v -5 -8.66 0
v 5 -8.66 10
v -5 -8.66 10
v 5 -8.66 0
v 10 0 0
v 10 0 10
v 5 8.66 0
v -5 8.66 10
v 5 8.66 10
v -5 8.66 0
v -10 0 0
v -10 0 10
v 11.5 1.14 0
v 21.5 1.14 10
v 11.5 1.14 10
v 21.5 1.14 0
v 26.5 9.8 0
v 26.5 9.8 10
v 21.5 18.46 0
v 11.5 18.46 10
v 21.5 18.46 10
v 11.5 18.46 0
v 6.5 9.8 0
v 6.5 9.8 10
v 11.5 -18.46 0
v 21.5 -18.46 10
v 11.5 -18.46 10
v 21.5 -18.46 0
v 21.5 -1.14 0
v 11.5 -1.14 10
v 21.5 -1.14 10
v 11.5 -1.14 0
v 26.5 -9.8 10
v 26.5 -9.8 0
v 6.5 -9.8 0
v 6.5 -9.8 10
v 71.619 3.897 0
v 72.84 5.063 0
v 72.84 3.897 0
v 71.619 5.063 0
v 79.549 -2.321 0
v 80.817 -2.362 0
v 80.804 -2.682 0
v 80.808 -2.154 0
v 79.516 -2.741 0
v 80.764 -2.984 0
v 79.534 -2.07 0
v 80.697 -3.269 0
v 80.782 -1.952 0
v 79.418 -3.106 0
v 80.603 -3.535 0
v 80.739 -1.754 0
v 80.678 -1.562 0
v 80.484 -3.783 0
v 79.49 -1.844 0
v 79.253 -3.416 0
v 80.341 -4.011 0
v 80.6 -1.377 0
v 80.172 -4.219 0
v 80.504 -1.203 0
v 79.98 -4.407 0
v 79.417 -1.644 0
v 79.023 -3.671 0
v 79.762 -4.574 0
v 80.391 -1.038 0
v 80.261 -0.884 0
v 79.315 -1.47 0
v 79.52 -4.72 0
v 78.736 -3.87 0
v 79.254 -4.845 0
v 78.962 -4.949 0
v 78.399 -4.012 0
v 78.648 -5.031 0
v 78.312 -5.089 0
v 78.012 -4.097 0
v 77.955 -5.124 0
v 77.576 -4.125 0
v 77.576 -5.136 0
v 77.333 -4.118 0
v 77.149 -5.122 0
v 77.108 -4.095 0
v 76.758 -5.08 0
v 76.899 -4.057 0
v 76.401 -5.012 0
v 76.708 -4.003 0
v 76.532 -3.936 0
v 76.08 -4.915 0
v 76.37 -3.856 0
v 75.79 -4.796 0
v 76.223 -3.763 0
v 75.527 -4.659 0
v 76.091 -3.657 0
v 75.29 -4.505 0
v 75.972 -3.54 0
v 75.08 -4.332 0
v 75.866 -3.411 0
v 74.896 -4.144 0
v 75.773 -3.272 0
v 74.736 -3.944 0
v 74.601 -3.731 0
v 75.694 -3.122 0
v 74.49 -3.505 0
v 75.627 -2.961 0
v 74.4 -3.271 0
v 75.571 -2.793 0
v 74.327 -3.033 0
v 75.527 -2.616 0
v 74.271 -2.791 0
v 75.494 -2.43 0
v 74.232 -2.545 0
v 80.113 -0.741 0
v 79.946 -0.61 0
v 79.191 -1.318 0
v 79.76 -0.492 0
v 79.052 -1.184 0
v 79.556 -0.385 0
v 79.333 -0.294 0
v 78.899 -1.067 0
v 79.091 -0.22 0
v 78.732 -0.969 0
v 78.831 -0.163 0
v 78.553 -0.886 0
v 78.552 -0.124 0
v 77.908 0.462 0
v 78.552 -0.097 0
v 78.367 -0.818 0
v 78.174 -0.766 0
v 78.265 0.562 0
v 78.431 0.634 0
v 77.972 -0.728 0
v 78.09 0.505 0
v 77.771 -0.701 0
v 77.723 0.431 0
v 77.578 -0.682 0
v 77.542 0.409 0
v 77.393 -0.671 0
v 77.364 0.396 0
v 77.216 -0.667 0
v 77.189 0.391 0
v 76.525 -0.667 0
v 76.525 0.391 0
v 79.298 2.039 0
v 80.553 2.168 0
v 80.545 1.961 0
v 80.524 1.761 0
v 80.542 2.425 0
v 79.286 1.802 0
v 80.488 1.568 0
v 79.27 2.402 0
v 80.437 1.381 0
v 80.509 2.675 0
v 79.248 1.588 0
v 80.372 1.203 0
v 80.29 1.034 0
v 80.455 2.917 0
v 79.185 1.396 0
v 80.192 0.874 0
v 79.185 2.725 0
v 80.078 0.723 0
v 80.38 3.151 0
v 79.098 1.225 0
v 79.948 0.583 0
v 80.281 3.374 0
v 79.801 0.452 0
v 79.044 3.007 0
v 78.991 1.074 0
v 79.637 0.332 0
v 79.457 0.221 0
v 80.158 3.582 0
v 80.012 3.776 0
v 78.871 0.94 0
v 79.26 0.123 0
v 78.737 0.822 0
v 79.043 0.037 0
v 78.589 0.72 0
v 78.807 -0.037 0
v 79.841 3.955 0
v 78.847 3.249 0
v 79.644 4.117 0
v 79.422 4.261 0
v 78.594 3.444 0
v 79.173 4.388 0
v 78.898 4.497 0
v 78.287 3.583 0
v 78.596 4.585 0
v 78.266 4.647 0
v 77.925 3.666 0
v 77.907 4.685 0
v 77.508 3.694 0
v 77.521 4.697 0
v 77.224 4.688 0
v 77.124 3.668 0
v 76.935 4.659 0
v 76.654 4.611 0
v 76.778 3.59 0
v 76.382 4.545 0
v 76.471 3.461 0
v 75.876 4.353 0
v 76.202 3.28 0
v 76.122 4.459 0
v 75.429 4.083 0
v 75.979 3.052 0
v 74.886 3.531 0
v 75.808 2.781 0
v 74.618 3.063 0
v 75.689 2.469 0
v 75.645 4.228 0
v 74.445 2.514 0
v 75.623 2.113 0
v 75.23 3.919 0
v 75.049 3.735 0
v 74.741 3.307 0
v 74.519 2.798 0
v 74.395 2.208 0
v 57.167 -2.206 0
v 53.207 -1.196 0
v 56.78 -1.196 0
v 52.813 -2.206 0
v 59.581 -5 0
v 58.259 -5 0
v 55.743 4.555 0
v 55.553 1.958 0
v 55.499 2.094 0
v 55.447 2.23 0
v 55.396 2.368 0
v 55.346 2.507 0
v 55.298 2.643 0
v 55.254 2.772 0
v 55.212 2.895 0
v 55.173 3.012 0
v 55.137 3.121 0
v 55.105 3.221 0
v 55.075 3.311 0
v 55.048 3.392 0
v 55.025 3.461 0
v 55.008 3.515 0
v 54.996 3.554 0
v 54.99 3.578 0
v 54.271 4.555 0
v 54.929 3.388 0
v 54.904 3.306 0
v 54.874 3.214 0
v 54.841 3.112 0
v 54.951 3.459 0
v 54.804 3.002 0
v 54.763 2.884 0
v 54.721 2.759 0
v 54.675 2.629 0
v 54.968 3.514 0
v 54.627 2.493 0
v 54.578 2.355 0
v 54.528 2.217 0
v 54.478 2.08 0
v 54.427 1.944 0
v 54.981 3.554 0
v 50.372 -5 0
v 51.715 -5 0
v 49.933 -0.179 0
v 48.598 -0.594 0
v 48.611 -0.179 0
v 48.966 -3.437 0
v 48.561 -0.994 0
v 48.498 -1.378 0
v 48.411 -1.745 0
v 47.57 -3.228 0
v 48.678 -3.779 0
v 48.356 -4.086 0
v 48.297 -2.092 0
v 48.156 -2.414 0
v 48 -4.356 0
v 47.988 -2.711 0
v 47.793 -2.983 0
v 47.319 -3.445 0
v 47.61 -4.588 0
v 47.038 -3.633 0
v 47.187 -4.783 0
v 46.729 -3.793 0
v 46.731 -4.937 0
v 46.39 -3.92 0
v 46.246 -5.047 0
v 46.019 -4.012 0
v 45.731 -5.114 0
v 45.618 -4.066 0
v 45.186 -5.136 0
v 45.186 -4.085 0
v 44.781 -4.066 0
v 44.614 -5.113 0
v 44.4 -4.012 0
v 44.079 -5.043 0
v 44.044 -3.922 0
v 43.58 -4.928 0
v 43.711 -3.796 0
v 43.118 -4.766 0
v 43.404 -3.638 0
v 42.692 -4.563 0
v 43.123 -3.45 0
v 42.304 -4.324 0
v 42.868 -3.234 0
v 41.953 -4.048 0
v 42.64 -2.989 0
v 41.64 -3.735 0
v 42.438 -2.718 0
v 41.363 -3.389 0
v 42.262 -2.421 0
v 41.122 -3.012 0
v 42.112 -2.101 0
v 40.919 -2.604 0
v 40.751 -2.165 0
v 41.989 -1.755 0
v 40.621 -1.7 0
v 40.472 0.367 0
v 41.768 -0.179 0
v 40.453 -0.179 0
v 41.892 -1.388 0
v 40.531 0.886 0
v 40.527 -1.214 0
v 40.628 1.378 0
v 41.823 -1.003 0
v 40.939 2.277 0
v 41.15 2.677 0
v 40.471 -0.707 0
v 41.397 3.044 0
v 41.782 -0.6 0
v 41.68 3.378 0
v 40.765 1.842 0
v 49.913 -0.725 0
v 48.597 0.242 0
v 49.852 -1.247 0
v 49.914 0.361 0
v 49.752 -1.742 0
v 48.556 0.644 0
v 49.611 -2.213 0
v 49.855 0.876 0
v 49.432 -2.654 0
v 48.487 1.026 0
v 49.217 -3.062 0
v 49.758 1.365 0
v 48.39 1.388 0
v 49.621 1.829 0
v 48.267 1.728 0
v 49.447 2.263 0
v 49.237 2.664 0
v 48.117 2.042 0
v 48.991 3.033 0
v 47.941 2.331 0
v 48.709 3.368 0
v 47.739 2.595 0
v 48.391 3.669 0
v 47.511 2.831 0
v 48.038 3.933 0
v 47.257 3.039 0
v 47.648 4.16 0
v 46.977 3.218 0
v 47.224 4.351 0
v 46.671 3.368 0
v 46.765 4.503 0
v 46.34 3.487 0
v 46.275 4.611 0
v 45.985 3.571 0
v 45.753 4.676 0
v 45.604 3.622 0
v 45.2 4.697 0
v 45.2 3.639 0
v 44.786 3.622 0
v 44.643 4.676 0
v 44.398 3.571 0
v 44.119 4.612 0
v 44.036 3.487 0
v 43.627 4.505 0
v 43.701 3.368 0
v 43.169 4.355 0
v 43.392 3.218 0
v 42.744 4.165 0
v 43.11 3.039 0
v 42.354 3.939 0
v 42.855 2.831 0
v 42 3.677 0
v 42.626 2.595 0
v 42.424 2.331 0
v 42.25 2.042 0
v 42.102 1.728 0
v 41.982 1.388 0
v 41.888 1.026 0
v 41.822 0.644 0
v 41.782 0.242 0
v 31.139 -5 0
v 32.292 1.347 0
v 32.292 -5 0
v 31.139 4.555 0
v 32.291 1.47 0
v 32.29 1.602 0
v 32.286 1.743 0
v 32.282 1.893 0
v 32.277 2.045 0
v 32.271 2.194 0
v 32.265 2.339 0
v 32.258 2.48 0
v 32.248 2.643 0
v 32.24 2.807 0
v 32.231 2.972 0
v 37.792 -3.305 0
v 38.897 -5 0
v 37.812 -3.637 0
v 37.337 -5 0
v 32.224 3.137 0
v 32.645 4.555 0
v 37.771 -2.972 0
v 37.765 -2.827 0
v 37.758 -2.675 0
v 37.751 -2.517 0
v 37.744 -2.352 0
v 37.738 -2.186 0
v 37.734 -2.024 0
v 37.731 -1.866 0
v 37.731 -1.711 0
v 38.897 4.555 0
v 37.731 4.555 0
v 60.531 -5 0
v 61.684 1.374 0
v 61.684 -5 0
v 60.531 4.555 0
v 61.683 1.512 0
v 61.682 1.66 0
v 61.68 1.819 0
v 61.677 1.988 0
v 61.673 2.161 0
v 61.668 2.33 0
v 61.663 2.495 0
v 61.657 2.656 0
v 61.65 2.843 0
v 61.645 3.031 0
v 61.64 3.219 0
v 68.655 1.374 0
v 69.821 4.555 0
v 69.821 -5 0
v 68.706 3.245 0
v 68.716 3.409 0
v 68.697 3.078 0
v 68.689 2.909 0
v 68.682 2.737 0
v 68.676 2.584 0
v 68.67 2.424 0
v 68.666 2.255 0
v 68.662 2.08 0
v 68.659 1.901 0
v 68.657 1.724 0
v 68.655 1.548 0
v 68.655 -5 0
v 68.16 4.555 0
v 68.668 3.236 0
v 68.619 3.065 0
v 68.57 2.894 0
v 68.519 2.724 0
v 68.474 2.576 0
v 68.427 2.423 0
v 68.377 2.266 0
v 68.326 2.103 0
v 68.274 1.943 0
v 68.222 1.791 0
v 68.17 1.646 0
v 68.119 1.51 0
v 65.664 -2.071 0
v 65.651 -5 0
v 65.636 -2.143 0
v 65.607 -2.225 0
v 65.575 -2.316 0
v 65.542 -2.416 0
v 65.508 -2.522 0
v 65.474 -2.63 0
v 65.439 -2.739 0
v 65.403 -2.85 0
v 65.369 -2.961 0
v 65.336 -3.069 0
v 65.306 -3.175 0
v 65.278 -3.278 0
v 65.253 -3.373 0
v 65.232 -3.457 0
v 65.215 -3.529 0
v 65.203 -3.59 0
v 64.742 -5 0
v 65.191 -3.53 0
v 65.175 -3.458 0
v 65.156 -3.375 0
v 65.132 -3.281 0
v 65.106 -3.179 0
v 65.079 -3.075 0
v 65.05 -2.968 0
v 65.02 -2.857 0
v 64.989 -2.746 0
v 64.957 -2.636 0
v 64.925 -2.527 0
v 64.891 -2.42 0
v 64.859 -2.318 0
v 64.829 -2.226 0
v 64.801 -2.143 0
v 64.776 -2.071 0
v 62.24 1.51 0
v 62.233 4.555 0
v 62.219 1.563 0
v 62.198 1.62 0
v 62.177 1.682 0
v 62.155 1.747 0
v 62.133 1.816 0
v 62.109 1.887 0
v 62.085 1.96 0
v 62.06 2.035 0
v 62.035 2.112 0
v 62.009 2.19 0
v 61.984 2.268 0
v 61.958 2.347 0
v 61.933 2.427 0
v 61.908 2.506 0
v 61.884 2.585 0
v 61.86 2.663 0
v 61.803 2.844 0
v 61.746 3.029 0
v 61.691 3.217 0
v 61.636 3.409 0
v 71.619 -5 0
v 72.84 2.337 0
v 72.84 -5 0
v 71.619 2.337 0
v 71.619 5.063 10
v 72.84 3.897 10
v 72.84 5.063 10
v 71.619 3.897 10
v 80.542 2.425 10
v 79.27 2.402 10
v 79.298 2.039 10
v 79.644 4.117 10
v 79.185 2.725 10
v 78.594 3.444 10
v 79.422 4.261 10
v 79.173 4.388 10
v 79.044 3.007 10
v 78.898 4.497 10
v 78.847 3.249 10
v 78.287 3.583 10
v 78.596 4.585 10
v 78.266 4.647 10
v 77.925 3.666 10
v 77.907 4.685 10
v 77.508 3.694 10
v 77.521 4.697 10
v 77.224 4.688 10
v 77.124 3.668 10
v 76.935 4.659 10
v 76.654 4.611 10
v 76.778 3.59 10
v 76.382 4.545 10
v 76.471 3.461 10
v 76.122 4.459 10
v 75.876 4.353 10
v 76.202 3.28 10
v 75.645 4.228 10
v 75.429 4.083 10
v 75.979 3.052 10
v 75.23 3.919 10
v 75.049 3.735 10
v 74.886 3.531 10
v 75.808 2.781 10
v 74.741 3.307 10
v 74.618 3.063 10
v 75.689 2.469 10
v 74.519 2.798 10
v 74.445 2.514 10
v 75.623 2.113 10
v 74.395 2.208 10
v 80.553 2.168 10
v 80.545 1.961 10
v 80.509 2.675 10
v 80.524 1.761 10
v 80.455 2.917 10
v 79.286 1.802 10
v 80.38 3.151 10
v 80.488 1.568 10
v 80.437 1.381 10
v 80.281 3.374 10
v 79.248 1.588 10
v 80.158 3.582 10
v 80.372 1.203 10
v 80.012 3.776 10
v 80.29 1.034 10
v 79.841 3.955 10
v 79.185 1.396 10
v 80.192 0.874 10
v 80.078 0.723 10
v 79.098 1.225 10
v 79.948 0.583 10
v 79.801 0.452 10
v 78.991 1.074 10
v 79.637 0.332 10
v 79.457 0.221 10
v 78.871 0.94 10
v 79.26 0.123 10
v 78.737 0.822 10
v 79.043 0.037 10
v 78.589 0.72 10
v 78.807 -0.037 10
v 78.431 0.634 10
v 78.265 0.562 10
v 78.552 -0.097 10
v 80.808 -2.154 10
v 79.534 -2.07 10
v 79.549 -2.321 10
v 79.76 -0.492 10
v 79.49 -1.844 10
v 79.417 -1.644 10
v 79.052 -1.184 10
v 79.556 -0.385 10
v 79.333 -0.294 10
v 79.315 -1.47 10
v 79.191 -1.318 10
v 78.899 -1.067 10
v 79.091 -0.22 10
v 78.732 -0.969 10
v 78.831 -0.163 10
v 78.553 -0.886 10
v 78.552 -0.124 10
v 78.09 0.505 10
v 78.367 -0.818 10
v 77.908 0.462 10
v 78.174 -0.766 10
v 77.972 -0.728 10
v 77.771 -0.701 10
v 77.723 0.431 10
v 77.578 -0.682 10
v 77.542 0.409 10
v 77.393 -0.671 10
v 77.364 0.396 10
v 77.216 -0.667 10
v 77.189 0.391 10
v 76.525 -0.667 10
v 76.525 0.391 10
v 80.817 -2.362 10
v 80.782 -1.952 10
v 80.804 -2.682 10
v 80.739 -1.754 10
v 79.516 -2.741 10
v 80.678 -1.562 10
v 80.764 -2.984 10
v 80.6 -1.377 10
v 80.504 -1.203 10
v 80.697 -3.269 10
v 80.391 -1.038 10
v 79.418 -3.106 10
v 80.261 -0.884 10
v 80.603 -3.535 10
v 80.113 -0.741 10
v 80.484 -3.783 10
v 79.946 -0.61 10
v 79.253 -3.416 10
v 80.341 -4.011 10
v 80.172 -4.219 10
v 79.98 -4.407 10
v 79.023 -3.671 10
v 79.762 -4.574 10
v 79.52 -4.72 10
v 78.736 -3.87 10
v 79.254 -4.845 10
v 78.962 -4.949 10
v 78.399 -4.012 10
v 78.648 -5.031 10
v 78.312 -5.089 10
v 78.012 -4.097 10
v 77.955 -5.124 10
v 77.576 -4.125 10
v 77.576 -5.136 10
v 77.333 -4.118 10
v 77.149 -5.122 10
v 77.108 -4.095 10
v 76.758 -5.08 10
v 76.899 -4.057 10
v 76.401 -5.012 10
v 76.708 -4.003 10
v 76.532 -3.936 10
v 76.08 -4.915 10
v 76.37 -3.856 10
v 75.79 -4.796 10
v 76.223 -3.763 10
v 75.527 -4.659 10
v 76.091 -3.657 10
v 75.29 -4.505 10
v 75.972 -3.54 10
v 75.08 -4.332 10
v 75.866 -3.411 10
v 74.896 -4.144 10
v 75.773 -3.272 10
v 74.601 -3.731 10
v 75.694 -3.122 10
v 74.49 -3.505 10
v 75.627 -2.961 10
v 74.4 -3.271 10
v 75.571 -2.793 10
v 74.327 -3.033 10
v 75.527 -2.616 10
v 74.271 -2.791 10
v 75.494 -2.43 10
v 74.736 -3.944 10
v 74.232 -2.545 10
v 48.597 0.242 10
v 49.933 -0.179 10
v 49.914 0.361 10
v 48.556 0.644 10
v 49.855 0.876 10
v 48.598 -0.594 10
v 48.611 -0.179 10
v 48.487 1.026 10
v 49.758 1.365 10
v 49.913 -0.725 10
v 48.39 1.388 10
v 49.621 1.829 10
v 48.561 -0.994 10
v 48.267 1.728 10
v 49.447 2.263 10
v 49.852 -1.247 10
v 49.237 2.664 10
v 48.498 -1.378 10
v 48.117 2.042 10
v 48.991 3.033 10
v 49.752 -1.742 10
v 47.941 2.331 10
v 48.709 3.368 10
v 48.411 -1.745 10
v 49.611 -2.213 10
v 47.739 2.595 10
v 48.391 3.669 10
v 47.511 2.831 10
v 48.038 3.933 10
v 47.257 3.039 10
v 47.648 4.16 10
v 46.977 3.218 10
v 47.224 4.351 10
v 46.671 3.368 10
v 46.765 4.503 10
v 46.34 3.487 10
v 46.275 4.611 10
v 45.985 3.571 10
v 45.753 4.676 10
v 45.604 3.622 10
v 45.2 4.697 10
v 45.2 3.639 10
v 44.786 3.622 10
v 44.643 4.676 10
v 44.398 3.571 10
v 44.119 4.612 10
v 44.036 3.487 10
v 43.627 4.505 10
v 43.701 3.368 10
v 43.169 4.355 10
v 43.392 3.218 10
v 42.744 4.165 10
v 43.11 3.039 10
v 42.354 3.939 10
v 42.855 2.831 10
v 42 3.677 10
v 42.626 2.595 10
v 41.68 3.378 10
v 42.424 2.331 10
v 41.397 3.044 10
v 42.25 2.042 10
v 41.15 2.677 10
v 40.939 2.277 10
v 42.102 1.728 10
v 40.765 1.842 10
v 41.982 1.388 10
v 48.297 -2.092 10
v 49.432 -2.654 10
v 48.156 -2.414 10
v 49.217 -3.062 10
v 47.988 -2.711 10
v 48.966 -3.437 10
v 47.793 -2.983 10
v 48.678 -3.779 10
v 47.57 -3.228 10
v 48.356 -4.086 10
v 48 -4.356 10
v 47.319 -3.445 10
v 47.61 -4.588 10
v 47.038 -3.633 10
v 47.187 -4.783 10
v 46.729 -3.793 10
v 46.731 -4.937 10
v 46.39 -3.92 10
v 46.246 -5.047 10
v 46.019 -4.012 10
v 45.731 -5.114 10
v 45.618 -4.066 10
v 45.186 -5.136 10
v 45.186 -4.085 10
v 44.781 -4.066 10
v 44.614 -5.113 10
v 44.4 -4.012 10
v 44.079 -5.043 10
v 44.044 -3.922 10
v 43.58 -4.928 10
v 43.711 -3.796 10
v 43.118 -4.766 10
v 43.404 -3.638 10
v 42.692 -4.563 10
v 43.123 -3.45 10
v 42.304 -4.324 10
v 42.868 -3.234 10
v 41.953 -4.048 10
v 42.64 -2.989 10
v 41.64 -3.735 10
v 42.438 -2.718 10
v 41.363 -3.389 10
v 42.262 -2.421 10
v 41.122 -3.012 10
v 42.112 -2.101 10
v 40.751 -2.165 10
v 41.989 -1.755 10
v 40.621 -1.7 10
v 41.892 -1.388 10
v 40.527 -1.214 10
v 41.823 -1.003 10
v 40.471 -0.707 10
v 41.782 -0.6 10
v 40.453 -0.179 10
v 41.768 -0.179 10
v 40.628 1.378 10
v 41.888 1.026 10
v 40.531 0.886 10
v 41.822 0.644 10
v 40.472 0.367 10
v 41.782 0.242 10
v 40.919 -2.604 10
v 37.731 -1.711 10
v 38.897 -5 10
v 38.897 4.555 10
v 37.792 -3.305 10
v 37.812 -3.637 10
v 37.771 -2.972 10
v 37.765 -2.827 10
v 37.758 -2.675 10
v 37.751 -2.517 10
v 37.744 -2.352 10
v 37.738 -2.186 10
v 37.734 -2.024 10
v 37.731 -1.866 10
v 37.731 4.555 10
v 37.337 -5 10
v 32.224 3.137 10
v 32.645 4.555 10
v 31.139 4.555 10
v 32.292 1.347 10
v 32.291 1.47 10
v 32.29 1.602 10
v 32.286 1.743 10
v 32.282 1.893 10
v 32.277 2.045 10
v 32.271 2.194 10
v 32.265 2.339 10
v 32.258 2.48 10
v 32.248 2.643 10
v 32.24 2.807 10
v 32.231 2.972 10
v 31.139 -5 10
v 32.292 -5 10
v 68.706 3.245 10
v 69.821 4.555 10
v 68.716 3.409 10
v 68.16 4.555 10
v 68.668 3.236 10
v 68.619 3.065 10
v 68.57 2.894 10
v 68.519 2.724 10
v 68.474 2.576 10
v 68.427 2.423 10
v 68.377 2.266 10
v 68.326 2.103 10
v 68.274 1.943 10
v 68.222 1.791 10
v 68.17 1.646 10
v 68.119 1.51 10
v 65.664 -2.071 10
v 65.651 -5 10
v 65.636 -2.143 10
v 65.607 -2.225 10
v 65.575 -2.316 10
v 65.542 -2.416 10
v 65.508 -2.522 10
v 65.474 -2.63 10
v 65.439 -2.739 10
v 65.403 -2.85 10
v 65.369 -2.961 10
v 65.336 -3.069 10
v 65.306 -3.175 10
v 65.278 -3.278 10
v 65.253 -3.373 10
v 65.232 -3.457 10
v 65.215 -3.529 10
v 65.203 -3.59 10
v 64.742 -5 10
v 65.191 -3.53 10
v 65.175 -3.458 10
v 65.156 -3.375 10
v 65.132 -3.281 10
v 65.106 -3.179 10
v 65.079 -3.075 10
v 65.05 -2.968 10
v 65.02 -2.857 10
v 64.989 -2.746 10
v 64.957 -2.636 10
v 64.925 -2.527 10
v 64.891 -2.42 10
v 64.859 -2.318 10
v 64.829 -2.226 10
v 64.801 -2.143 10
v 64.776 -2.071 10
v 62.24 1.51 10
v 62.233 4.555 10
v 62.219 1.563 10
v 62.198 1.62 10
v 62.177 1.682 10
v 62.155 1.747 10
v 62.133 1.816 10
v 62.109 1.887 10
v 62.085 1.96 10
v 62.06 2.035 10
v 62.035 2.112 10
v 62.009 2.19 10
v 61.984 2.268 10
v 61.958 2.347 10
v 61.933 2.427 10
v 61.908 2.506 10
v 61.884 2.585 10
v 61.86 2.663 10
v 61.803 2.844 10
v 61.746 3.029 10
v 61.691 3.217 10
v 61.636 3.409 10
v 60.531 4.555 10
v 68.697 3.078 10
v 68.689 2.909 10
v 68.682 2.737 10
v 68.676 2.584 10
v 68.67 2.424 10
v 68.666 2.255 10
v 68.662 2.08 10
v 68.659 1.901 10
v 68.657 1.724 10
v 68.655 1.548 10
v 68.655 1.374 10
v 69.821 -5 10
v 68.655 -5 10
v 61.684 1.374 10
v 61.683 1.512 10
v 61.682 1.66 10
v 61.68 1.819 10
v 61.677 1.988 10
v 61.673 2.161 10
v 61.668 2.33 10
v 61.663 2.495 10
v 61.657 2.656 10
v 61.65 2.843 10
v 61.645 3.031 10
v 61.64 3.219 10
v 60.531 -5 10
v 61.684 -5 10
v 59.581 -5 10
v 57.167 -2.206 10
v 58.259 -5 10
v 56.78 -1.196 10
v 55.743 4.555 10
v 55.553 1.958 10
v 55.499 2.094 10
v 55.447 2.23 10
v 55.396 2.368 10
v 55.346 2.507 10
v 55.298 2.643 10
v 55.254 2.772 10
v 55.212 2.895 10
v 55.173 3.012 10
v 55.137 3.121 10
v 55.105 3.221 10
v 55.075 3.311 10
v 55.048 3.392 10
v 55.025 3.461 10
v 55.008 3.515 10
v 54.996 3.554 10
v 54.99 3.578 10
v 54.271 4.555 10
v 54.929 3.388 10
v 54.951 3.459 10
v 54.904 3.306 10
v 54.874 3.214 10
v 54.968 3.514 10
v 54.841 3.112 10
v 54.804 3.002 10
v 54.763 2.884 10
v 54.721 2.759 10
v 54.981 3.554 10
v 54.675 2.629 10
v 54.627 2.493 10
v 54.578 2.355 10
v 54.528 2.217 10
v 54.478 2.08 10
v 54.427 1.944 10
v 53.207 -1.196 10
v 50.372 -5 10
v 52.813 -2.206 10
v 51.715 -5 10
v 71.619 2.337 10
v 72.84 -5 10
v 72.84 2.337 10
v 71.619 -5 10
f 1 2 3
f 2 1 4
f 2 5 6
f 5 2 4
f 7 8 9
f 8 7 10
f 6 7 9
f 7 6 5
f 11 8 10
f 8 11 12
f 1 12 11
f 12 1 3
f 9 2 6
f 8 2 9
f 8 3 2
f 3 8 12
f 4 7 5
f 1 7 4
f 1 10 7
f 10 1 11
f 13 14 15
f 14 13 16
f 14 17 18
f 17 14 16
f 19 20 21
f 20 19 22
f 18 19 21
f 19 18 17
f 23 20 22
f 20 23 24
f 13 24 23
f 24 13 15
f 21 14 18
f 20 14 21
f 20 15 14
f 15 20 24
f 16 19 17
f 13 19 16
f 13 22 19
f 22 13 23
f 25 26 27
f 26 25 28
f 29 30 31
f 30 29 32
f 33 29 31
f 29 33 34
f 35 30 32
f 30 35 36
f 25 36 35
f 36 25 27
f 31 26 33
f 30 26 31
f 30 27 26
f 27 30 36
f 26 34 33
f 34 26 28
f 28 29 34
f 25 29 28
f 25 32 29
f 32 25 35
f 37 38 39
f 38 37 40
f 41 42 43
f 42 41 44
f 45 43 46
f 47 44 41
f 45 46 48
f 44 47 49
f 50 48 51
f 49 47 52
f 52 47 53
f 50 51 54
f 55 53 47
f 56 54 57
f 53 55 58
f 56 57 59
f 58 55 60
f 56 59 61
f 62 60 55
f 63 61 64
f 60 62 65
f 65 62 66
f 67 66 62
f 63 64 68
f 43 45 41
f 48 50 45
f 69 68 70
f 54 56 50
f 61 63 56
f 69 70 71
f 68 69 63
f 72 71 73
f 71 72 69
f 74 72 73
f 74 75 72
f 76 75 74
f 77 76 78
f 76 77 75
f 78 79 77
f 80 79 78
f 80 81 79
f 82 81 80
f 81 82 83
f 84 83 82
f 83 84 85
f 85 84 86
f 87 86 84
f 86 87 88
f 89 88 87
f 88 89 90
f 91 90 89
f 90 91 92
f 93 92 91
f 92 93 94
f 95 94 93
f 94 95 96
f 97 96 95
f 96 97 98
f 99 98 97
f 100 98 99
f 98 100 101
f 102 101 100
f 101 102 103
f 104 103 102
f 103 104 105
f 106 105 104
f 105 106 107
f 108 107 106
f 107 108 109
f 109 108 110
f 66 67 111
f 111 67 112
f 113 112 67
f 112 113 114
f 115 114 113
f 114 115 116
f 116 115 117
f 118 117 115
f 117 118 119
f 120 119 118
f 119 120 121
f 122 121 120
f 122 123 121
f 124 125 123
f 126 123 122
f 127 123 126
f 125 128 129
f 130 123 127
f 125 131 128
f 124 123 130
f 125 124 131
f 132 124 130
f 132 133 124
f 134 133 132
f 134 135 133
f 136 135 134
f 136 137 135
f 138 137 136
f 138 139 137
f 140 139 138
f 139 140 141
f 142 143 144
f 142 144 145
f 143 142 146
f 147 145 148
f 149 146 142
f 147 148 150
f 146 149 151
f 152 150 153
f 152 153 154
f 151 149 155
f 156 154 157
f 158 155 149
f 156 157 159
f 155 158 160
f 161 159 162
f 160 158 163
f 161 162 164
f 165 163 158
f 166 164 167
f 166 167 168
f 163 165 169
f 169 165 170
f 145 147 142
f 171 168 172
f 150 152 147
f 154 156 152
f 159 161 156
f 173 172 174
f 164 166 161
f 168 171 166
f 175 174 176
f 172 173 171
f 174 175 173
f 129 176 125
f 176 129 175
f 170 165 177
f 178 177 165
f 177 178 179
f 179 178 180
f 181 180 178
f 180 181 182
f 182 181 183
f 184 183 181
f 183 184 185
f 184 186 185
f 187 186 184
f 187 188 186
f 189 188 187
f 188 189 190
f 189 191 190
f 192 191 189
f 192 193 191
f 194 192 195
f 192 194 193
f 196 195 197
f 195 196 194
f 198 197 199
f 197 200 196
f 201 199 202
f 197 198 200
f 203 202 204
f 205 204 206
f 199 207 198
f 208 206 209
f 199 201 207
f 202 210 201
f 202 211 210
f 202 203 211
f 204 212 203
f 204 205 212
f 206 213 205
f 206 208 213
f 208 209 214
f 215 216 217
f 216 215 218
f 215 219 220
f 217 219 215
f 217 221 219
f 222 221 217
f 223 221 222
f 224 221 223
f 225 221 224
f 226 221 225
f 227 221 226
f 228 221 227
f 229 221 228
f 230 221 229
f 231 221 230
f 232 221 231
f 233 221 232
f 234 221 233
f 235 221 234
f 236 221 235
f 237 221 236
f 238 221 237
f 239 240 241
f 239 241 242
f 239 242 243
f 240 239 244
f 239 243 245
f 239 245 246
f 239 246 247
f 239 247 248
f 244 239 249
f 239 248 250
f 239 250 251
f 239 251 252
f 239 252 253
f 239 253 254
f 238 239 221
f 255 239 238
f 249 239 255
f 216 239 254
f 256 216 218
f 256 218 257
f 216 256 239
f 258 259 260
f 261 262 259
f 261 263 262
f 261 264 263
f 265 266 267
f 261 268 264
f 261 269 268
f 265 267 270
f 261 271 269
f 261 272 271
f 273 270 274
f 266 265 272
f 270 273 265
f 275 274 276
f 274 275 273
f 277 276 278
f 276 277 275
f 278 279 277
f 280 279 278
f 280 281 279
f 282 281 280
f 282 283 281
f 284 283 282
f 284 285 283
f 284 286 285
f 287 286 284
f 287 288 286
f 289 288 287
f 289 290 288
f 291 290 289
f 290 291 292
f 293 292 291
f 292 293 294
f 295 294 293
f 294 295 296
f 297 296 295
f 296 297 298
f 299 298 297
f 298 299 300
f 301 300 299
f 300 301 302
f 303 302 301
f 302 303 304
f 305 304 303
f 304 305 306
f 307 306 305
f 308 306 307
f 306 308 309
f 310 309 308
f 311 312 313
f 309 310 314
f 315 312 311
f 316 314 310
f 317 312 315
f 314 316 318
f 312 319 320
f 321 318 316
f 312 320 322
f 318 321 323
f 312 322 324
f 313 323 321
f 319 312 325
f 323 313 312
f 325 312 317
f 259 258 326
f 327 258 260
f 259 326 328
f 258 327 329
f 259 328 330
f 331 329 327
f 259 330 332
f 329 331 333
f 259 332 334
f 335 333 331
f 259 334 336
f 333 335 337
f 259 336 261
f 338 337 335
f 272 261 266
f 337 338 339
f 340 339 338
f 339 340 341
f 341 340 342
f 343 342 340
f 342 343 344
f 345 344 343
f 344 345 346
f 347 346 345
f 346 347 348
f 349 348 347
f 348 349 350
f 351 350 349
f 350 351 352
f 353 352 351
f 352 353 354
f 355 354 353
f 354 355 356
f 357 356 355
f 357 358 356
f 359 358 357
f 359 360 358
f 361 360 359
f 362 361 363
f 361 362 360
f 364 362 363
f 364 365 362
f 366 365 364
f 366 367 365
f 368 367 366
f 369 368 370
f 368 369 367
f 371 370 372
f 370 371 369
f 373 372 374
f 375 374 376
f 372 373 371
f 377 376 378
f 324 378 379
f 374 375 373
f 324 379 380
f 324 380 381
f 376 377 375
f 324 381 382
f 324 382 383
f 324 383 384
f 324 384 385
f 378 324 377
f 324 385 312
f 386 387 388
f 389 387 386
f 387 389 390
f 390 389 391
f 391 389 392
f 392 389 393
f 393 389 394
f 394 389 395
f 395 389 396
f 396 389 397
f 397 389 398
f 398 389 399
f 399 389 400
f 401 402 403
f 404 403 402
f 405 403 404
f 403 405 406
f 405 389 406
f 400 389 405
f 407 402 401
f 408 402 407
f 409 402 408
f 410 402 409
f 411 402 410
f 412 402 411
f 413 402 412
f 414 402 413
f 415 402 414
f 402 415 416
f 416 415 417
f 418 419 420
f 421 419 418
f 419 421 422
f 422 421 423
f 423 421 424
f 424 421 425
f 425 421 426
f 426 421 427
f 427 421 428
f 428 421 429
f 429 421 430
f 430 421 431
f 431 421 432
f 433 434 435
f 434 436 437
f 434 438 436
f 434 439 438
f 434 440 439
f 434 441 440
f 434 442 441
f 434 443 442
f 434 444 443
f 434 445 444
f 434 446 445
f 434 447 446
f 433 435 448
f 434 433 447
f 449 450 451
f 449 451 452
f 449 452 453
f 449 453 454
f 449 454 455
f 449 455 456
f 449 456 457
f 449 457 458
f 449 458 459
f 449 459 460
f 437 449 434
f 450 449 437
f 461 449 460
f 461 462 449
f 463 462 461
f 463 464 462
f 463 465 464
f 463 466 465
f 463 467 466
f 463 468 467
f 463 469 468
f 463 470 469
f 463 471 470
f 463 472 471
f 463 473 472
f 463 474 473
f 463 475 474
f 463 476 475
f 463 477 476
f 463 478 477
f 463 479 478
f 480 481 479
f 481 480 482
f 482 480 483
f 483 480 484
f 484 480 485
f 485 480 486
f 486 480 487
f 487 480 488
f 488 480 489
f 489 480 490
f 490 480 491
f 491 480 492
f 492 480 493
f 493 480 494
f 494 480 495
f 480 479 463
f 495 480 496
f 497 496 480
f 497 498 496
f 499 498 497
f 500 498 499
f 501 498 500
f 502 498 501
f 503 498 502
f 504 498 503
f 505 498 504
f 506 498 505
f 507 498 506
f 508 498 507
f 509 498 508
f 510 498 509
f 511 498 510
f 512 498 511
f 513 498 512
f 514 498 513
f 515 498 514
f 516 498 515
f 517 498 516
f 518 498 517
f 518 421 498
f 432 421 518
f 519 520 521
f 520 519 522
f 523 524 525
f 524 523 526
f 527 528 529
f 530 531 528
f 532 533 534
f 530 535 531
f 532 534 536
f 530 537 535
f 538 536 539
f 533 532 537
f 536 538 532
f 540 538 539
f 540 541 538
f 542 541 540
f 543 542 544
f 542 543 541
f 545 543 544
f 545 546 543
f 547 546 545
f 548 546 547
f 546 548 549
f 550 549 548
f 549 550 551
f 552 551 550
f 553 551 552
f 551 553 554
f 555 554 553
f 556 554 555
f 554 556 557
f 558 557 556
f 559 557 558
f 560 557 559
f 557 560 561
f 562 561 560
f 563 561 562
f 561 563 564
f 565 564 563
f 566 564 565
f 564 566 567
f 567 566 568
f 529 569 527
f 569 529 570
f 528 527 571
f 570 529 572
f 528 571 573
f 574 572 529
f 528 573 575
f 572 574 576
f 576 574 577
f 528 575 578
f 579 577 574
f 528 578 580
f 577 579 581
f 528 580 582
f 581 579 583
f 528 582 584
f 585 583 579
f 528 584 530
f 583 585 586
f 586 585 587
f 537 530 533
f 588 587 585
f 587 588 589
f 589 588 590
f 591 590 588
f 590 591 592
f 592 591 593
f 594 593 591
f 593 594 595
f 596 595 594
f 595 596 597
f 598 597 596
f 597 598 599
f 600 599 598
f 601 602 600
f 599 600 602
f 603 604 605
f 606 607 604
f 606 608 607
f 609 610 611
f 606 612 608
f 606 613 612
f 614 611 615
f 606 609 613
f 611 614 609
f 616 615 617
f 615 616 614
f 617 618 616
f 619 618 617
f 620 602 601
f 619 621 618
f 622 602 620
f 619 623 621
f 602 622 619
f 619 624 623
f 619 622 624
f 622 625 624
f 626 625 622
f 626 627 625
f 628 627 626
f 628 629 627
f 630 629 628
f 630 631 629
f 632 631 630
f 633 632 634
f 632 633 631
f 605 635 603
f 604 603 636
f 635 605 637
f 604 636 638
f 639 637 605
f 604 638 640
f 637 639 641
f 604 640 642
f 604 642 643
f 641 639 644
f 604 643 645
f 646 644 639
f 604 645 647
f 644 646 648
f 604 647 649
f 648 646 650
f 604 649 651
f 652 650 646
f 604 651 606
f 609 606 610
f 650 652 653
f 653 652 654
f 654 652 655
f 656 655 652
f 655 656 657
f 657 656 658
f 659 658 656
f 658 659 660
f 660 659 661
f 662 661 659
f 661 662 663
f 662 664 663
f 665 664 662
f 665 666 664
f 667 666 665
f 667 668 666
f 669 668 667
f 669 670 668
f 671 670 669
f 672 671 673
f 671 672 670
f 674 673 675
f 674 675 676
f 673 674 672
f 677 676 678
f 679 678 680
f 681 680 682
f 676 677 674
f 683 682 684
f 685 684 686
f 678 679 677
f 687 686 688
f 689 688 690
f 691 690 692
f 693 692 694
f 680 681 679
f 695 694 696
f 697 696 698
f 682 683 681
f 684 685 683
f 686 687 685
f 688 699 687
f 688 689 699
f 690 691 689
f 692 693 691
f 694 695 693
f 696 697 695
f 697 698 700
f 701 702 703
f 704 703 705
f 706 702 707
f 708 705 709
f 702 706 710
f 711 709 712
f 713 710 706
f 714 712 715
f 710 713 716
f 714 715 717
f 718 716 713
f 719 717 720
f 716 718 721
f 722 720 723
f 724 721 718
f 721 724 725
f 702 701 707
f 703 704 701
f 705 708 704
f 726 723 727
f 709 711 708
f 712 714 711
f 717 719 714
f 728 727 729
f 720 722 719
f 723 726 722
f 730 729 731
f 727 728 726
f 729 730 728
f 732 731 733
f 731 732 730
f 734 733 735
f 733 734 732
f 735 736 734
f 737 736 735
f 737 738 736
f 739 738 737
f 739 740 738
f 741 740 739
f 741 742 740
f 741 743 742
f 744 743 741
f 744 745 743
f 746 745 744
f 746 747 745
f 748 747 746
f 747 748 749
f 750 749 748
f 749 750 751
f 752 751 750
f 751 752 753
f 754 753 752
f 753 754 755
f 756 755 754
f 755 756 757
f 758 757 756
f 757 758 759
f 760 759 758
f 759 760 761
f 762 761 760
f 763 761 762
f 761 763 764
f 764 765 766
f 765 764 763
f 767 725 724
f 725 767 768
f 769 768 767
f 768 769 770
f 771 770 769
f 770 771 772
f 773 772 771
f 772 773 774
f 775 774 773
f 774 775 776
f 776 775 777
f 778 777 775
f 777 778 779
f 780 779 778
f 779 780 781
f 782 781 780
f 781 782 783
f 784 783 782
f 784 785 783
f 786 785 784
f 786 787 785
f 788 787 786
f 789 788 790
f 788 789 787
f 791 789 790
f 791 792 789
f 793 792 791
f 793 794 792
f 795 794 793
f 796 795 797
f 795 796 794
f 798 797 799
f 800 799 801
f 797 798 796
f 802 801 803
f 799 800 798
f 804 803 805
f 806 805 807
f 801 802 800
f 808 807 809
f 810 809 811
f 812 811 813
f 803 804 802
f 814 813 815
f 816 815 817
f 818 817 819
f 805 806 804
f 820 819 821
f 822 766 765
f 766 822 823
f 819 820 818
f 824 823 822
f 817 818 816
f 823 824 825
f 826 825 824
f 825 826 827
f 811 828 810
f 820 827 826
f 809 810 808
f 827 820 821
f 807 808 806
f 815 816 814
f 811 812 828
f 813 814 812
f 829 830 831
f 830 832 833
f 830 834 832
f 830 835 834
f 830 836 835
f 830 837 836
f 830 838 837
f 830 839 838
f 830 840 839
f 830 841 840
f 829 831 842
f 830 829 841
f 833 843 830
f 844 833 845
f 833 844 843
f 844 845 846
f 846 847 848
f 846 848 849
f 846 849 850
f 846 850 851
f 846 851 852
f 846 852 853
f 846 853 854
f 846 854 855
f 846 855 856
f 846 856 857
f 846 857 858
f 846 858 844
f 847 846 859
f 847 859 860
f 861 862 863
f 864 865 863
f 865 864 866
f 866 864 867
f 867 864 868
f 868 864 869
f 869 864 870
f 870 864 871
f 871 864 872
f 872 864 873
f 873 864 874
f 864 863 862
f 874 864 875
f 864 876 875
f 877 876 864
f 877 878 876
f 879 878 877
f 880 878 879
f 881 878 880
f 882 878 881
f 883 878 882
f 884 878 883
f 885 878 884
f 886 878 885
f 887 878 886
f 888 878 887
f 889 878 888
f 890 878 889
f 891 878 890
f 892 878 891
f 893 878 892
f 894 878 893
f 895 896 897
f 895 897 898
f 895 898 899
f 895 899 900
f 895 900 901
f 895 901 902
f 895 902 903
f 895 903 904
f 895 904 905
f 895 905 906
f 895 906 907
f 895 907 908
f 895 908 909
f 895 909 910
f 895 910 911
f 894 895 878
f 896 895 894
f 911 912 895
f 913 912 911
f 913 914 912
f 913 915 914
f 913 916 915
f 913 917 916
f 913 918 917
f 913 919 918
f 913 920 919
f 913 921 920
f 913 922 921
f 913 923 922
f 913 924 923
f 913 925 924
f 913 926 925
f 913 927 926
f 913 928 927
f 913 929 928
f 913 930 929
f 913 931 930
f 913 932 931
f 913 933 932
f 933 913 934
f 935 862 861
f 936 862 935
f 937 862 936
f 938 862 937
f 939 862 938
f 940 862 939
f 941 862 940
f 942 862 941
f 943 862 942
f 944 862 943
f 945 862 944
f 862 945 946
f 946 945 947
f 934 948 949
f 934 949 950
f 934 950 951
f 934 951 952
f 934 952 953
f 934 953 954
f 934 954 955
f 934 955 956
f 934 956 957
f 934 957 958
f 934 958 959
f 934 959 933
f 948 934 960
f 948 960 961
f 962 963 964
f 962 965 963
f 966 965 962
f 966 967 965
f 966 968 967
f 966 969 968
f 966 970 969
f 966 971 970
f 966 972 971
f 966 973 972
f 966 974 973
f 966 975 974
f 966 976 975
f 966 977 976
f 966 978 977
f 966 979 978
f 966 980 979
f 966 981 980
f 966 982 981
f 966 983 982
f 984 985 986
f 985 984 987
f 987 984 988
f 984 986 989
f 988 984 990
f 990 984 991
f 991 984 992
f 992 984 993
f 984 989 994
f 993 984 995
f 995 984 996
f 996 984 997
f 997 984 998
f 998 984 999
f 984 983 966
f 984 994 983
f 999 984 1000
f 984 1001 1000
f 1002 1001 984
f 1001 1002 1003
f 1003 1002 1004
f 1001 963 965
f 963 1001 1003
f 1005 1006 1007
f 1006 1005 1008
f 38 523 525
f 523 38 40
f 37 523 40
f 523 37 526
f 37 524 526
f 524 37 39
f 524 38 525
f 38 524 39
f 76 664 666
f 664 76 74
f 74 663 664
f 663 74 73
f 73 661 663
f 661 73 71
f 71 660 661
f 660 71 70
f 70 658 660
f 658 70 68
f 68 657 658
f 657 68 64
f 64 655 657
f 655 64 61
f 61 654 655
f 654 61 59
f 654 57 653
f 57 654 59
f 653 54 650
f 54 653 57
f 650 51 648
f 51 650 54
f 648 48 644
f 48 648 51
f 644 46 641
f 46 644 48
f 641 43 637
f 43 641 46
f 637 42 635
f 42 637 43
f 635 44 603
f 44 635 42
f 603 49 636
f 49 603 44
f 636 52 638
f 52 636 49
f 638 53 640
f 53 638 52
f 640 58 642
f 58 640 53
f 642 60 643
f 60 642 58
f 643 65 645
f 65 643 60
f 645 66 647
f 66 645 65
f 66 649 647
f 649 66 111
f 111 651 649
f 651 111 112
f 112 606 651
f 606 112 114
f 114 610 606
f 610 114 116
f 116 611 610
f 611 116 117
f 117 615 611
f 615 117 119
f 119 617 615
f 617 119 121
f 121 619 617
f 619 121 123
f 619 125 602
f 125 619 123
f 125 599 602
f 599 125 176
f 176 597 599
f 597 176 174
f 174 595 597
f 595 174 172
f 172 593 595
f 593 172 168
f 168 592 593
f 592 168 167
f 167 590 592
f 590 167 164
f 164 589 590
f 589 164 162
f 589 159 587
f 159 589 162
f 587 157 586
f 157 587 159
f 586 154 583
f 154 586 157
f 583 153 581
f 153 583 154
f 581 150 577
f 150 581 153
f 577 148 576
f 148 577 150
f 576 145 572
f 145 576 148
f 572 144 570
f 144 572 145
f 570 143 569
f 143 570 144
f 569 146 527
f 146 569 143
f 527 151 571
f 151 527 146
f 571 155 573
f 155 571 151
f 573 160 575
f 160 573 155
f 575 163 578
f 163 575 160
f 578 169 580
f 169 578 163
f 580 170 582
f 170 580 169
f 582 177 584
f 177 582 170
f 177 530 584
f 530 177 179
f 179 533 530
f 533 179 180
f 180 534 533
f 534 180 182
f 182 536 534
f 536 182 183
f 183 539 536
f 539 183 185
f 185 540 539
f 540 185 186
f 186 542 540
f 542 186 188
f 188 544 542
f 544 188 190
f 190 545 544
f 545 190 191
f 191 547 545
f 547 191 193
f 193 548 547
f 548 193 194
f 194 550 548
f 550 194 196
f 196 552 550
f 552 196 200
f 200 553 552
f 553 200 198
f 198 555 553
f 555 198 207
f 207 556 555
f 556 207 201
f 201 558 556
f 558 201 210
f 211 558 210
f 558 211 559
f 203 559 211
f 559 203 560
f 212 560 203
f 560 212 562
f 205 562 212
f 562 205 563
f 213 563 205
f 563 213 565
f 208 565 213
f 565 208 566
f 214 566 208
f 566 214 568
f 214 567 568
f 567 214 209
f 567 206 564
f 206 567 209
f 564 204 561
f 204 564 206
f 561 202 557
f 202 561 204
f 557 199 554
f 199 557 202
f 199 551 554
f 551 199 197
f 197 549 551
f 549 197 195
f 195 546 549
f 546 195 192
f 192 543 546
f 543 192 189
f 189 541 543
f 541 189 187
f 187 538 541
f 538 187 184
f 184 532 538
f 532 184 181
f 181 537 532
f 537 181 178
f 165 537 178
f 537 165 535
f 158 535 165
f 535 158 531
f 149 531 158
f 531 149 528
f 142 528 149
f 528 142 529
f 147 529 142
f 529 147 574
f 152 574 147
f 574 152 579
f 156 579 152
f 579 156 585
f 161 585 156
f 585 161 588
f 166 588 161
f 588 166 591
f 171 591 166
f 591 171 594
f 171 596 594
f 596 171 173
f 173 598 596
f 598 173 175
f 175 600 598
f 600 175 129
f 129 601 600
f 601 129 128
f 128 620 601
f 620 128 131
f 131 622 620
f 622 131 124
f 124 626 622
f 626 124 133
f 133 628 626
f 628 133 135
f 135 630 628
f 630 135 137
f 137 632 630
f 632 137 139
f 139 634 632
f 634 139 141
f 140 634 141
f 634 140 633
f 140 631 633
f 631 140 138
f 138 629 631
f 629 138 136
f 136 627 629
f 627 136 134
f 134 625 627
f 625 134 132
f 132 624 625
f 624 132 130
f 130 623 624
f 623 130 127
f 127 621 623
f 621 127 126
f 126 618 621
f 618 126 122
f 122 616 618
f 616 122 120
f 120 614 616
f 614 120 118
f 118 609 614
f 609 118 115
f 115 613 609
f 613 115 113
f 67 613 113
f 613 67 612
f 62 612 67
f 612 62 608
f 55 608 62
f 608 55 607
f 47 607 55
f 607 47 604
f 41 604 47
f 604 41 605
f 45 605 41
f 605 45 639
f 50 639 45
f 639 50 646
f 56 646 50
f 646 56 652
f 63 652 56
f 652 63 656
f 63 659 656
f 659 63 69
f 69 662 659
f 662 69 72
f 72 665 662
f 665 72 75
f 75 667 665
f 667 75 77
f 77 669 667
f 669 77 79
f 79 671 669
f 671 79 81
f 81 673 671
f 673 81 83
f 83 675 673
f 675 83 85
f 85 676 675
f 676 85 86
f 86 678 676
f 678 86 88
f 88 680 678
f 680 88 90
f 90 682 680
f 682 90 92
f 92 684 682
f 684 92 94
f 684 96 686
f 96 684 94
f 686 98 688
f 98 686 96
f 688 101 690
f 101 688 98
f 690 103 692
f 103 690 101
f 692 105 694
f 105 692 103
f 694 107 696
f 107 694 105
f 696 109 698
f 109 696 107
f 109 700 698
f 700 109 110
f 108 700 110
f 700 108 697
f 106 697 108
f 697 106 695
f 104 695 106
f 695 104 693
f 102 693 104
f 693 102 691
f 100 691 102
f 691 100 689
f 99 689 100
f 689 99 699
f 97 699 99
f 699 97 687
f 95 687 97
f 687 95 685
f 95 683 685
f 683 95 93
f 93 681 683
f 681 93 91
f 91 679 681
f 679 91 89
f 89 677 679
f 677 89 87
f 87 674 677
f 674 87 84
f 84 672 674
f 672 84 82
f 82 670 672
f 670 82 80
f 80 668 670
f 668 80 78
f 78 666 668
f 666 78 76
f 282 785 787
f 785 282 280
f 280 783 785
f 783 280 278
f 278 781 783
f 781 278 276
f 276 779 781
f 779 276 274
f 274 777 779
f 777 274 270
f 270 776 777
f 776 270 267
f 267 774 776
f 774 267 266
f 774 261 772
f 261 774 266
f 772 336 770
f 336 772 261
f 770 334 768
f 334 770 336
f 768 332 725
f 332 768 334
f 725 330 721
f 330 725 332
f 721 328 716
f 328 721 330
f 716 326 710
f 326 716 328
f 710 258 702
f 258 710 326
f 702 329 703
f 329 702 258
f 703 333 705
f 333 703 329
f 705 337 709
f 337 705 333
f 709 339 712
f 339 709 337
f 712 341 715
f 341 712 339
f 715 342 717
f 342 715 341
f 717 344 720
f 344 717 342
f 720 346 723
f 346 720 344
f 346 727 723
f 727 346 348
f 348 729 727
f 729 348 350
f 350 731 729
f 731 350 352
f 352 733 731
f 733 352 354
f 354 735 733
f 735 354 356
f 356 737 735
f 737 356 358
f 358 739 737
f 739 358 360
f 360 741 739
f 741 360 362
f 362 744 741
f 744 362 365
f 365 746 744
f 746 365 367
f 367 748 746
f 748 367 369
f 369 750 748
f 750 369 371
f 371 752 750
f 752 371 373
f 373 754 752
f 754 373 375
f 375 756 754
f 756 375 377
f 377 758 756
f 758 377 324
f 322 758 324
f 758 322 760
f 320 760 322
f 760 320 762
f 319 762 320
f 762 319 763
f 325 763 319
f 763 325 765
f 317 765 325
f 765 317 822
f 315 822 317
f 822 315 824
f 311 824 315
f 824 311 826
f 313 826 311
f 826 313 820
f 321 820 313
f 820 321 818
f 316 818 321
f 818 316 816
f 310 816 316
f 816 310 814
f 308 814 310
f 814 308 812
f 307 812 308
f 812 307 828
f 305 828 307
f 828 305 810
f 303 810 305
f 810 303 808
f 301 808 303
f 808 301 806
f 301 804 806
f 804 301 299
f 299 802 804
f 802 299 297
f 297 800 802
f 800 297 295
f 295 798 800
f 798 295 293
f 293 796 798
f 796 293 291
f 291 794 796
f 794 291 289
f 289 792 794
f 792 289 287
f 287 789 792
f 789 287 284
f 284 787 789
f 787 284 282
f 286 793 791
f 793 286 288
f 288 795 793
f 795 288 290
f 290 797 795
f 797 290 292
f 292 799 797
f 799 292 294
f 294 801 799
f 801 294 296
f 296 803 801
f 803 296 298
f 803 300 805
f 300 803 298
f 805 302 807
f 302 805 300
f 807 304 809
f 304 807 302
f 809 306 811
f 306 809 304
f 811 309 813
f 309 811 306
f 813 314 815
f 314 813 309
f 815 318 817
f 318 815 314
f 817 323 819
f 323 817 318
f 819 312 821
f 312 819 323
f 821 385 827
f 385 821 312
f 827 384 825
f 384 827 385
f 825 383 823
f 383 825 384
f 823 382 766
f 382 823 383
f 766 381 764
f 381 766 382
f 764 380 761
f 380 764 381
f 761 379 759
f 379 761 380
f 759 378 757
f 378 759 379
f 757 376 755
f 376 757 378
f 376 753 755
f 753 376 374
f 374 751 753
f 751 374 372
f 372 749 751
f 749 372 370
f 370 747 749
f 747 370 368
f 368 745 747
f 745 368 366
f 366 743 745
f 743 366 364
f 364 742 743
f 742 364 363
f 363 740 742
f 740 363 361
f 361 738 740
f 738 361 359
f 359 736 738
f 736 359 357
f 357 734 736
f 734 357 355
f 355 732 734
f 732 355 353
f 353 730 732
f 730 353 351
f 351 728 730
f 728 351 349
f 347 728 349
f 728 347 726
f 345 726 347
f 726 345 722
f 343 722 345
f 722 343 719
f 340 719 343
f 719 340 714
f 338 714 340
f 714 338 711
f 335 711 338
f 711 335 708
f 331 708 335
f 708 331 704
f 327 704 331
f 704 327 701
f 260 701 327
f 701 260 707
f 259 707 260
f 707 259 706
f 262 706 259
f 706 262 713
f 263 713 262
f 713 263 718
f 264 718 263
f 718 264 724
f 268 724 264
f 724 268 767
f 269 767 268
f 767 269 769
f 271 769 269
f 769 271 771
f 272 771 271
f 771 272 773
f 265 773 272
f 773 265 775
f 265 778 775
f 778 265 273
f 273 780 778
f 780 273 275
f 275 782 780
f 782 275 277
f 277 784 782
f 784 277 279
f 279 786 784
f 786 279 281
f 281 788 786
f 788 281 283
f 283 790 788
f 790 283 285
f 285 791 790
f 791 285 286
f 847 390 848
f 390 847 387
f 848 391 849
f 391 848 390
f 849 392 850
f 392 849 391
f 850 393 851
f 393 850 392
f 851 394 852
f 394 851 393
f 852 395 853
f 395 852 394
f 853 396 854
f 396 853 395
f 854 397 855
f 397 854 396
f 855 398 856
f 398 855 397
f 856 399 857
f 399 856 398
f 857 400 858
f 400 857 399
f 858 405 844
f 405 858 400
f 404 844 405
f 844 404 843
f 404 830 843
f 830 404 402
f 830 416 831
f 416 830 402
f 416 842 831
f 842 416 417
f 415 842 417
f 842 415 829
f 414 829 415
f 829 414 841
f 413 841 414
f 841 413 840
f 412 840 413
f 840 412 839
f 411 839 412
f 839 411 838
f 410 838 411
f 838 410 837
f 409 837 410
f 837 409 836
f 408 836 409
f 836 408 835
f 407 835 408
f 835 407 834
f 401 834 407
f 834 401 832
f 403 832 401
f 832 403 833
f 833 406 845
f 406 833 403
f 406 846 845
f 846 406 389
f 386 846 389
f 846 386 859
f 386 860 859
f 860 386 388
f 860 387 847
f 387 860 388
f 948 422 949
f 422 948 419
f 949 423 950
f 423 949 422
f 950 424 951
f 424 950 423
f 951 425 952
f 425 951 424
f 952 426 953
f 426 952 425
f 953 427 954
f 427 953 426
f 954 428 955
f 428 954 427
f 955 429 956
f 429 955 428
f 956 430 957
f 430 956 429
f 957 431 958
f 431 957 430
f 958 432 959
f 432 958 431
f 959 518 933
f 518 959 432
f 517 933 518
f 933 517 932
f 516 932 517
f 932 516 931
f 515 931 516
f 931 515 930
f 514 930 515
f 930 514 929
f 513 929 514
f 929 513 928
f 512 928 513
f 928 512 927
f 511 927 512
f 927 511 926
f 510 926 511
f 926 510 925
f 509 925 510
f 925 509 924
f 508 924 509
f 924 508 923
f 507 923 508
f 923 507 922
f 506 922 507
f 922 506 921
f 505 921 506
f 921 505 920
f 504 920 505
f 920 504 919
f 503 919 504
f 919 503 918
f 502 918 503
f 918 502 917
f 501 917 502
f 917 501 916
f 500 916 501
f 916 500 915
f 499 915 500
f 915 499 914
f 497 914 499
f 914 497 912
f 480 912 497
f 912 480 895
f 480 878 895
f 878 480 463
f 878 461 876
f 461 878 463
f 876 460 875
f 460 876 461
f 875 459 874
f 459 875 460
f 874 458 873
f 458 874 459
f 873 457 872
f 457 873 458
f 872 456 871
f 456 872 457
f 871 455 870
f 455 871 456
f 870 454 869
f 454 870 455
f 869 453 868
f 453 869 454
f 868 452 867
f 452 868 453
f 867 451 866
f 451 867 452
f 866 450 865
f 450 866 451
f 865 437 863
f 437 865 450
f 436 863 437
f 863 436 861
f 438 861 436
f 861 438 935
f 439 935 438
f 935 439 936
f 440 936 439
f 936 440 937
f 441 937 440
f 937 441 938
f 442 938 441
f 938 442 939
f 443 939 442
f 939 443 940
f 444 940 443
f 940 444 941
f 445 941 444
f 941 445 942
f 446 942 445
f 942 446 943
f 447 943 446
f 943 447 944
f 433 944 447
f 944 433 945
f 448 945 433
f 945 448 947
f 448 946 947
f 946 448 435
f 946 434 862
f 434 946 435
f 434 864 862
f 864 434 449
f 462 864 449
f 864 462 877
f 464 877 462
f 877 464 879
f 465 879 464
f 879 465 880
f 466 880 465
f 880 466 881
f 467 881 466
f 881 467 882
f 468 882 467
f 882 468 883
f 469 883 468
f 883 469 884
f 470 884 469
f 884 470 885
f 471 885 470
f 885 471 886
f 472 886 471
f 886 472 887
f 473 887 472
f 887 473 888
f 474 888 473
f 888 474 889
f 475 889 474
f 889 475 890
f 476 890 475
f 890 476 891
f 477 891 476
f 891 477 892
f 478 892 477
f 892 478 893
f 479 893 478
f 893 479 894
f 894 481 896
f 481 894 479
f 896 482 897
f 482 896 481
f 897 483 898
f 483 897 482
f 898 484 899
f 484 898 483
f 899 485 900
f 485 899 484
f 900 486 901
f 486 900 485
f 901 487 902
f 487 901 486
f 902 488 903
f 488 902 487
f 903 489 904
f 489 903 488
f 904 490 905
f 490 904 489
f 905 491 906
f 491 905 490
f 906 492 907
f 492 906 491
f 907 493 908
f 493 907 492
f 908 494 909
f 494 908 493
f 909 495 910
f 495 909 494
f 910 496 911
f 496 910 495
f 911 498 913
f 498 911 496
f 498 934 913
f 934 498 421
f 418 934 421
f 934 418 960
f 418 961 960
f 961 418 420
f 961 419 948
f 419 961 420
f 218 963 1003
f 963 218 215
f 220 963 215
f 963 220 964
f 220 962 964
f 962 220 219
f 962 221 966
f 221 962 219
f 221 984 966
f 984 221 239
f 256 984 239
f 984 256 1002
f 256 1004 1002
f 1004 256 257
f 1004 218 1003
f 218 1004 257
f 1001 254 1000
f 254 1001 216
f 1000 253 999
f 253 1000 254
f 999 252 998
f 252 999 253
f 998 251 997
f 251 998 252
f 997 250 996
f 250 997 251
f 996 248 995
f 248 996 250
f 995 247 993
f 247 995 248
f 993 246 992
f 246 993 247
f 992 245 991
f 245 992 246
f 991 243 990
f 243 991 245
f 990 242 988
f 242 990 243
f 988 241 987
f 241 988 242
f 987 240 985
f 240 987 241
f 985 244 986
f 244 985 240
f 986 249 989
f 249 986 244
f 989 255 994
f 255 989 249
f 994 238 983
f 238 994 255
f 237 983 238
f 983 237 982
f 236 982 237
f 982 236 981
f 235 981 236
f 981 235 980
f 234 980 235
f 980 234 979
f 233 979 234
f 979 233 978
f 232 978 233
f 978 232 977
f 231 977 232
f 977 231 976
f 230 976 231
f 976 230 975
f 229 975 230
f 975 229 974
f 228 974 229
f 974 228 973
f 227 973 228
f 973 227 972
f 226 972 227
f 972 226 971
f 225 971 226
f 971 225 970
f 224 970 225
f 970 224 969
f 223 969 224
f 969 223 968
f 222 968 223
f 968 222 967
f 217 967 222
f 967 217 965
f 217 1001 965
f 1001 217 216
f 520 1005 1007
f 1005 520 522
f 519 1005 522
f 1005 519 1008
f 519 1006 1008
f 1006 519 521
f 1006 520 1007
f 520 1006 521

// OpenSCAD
cylinder(h=10, r=10,$fn=6);
translate([16.5,9.8,0]) cylinder(h=10, r=10,$fn=6);
translate([16.5,-9.8,0]) cylinder(h=10, r=10,$fn=6);

linear_extrude(height=10) translate ([30,-5,0]) text("NOAMi3");
